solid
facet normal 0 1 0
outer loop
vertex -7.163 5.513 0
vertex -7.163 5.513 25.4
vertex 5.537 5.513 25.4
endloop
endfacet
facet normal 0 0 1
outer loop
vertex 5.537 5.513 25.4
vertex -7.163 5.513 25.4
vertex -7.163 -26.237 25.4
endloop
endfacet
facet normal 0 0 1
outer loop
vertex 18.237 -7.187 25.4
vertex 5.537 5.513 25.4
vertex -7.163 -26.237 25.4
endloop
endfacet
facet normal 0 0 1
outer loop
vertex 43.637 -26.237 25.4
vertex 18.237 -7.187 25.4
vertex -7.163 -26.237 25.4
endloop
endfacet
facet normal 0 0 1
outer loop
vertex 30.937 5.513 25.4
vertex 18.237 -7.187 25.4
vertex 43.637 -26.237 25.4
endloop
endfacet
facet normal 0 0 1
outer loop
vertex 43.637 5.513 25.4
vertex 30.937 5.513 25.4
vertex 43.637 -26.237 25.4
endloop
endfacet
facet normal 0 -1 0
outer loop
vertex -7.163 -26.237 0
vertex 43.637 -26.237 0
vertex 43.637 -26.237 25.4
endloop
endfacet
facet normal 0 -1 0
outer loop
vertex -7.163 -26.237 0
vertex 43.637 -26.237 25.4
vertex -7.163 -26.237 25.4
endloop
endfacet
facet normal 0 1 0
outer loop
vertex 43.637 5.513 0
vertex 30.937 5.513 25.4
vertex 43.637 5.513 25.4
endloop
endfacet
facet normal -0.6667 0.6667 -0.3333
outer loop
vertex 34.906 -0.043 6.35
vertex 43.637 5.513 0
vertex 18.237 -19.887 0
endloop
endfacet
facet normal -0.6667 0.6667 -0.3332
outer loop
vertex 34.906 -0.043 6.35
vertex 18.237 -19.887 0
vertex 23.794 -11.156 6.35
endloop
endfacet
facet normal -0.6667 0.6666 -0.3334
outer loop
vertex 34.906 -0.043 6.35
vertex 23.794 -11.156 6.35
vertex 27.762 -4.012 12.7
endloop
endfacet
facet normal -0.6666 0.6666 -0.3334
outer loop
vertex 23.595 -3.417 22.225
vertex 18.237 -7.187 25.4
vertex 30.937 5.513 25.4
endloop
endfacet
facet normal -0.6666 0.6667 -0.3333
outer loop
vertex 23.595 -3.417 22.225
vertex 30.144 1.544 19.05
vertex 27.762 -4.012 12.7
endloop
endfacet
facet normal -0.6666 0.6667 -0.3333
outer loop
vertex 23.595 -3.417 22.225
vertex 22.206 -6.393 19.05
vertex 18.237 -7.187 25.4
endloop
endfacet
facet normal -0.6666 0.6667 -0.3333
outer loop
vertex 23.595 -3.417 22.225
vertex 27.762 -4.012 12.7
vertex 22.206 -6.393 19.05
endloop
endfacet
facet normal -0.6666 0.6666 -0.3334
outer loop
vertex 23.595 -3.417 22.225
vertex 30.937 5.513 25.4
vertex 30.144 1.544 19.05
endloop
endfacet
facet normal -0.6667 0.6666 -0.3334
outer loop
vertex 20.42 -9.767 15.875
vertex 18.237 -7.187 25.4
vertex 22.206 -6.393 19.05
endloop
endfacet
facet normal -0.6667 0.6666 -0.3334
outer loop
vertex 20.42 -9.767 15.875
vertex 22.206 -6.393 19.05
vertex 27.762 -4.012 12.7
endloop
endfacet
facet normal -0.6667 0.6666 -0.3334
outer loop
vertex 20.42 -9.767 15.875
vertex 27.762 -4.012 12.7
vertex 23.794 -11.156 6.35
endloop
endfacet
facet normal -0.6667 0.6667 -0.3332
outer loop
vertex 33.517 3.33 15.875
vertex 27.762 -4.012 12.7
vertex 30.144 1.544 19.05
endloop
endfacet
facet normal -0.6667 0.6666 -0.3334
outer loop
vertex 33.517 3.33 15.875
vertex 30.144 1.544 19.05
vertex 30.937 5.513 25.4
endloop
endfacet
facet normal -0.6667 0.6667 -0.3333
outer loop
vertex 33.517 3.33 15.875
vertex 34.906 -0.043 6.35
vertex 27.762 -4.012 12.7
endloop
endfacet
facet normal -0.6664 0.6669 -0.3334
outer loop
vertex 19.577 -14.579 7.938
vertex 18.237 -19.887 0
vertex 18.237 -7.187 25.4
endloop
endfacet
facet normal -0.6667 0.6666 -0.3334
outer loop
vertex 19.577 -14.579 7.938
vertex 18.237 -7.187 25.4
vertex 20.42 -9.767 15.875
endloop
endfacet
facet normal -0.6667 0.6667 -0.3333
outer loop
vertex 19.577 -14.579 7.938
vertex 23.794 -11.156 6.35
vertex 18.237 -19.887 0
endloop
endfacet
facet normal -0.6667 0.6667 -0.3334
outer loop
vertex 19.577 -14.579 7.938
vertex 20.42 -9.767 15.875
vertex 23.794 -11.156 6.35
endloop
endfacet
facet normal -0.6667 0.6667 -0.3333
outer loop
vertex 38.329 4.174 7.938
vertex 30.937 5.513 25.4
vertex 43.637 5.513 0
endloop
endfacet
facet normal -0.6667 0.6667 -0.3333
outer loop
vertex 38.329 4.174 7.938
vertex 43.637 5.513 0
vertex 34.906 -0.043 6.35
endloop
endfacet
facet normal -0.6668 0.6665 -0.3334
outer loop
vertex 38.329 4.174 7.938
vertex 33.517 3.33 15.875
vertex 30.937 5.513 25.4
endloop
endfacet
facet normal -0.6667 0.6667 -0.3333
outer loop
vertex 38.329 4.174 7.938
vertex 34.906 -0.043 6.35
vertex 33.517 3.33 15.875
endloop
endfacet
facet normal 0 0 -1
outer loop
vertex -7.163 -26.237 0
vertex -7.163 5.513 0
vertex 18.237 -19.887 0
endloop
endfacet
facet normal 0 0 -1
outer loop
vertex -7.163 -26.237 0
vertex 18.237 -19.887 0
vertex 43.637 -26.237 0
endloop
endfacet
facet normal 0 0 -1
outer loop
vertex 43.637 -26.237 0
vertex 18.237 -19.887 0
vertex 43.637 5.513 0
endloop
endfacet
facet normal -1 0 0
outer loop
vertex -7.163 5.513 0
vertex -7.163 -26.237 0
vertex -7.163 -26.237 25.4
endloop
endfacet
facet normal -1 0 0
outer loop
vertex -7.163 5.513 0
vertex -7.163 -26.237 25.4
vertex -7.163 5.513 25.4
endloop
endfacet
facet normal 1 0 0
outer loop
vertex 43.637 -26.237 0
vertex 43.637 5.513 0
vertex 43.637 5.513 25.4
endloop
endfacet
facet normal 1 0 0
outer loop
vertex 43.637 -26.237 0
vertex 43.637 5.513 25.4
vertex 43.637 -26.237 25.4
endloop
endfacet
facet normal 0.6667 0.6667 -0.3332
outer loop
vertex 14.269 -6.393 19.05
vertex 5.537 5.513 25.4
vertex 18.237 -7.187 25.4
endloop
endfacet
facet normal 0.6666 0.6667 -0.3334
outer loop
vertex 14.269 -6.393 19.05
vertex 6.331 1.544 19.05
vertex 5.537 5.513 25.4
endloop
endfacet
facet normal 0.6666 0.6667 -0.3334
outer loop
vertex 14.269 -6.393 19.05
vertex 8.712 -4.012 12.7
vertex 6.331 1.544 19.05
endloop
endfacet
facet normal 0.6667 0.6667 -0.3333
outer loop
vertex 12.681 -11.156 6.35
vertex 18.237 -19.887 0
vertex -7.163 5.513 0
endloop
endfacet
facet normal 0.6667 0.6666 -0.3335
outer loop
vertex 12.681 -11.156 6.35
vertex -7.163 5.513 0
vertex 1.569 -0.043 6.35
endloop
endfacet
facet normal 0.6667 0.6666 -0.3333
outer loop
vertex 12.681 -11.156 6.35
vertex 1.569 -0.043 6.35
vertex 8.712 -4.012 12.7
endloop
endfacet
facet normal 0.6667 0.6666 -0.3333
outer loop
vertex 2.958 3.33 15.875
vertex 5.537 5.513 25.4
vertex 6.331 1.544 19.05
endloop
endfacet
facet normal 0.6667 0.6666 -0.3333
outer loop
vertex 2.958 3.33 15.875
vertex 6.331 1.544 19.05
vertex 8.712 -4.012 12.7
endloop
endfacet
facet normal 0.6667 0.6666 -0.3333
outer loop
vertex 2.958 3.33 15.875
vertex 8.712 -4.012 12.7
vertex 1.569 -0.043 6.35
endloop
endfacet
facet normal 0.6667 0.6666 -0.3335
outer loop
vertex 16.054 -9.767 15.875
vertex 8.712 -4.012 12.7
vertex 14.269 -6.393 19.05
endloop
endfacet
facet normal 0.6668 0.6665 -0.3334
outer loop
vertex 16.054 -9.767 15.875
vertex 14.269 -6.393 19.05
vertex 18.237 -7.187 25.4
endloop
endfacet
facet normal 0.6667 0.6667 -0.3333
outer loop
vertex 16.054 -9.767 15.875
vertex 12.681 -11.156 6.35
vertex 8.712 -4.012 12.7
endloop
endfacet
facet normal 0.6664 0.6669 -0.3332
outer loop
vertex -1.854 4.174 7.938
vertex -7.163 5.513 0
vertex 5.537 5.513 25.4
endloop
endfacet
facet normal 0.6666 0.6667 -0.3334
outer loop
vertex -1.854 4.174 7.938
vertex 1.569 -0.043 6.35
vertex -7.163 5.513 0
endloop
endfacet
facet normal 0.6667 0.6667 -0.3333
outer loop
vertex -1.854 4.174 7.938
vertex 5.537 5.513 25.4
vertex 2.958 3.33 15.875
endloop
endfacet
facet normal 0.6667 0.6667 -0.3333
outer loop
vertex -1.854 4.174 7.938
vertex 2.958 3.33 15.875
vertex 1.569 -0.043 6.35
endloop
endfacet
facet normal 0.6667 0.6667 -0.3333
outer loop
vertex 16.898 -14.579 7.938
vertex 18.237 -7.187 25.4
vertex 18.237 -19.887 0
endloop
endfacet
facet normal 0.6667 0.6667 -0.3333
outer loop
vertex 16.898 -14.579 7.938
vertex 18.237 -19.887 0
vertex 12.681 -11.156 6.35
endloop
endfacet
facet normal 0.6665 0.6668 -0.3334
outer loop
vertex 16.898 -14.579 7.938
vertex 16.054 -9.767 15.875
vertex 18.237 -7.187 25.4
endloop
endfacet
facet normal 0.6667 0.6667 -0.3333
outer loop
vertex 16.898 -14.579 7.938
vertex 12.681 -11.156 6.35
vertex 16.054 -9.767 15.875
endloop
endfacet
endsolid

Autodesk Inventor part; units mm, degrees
ref_plane "YZ Plane" through (0, 0, 0) normal (1, 0, 0) x (0, 1, 0)
ref_plane "XZ Plane" through (0, 0, 0) normal (0, 1, 0) x (-1, 0, 0)
ref_plane "XY Plane" through (0, 0, 0) normal (0, 0, 1) x (1, 0, 0)
sketch "Sketch1" plane through (0, 0, 0) normal (0, 0, 1) x (1, 0, 0)
  line L0 (-7.1627, 5.5131) -> (43.6373, 5.5131)
  line L1 (43.6373, 5.5131) -> (43.6373, -26.2369)
  line L2 (43.6373, -26.2369) -> (-7.1627, -26.2369)
  line L3 (-7.1627, -26.2369) -> (-7.1627, 5.5131)
  point P0 (0, 0)
  dimension "d0" = 50.8
  dimension "d1" = 31.75
extrude "Extrusion1" add sketch "Sketch1" along normal blind 25.4
sketch "Sketch4" plane through (0, 0, 0) normal (0, 0, -1) x (-1, 0, 0)
  line L0 (-43.6373, 5.5131) -> (7.1627, 5.5131) projected
  line L1 (-43.6373, 5.5131) -> (-18.2373, -19.8869)
  line L2 (-18.2373, -19.8869) -> (7.1627, 5.5131)
  line L3 (7.1627, 5.5131) -> (-43.6373, 5.5131)
  line L4 (-43.6373, -26.2369) -> (7.1627, -26.2369) projected
  line L5 (7.1627, -26.2369) -> (7.1627, 5.5131) projected
  point P0 (0, 0)
  dimension "d10" = 6.35
  dimension "d11" = 25.4
  dimension "d12" = 0
  dimension "d13" = 0
sketch "Sketch6" plane through (0, 0, 25.4) normal (0, 0, 1) x (1, 0, 0)
  line L0 (43.6373, 5.5131) -> (-7.1627, 5.5131) projected
  line L1 (5.5373, 5.5131) -> (18.2373, -7.1869)
  line L2 (18.2373, -7.1869) -> (30.9373, 5.5131)
  line L3 (5.5373, 5.5131) -> (30.9373, 5.5131)
  line L4 (-7.1627, -26.2369) -> (43.6373, -26.2369) projected
  line L5 (43.6373, -26.2369) -> (43.6373, 5.5131) projected
  point P0 (0, 0)
  dimension "d14" = 12.7
  dimension "d15" = 12.7
  dimension "d16" = 19.05
  dimension "d17" = 25.4
loft "Loft1" cut profiles "Sketch6", "Sketch4"
